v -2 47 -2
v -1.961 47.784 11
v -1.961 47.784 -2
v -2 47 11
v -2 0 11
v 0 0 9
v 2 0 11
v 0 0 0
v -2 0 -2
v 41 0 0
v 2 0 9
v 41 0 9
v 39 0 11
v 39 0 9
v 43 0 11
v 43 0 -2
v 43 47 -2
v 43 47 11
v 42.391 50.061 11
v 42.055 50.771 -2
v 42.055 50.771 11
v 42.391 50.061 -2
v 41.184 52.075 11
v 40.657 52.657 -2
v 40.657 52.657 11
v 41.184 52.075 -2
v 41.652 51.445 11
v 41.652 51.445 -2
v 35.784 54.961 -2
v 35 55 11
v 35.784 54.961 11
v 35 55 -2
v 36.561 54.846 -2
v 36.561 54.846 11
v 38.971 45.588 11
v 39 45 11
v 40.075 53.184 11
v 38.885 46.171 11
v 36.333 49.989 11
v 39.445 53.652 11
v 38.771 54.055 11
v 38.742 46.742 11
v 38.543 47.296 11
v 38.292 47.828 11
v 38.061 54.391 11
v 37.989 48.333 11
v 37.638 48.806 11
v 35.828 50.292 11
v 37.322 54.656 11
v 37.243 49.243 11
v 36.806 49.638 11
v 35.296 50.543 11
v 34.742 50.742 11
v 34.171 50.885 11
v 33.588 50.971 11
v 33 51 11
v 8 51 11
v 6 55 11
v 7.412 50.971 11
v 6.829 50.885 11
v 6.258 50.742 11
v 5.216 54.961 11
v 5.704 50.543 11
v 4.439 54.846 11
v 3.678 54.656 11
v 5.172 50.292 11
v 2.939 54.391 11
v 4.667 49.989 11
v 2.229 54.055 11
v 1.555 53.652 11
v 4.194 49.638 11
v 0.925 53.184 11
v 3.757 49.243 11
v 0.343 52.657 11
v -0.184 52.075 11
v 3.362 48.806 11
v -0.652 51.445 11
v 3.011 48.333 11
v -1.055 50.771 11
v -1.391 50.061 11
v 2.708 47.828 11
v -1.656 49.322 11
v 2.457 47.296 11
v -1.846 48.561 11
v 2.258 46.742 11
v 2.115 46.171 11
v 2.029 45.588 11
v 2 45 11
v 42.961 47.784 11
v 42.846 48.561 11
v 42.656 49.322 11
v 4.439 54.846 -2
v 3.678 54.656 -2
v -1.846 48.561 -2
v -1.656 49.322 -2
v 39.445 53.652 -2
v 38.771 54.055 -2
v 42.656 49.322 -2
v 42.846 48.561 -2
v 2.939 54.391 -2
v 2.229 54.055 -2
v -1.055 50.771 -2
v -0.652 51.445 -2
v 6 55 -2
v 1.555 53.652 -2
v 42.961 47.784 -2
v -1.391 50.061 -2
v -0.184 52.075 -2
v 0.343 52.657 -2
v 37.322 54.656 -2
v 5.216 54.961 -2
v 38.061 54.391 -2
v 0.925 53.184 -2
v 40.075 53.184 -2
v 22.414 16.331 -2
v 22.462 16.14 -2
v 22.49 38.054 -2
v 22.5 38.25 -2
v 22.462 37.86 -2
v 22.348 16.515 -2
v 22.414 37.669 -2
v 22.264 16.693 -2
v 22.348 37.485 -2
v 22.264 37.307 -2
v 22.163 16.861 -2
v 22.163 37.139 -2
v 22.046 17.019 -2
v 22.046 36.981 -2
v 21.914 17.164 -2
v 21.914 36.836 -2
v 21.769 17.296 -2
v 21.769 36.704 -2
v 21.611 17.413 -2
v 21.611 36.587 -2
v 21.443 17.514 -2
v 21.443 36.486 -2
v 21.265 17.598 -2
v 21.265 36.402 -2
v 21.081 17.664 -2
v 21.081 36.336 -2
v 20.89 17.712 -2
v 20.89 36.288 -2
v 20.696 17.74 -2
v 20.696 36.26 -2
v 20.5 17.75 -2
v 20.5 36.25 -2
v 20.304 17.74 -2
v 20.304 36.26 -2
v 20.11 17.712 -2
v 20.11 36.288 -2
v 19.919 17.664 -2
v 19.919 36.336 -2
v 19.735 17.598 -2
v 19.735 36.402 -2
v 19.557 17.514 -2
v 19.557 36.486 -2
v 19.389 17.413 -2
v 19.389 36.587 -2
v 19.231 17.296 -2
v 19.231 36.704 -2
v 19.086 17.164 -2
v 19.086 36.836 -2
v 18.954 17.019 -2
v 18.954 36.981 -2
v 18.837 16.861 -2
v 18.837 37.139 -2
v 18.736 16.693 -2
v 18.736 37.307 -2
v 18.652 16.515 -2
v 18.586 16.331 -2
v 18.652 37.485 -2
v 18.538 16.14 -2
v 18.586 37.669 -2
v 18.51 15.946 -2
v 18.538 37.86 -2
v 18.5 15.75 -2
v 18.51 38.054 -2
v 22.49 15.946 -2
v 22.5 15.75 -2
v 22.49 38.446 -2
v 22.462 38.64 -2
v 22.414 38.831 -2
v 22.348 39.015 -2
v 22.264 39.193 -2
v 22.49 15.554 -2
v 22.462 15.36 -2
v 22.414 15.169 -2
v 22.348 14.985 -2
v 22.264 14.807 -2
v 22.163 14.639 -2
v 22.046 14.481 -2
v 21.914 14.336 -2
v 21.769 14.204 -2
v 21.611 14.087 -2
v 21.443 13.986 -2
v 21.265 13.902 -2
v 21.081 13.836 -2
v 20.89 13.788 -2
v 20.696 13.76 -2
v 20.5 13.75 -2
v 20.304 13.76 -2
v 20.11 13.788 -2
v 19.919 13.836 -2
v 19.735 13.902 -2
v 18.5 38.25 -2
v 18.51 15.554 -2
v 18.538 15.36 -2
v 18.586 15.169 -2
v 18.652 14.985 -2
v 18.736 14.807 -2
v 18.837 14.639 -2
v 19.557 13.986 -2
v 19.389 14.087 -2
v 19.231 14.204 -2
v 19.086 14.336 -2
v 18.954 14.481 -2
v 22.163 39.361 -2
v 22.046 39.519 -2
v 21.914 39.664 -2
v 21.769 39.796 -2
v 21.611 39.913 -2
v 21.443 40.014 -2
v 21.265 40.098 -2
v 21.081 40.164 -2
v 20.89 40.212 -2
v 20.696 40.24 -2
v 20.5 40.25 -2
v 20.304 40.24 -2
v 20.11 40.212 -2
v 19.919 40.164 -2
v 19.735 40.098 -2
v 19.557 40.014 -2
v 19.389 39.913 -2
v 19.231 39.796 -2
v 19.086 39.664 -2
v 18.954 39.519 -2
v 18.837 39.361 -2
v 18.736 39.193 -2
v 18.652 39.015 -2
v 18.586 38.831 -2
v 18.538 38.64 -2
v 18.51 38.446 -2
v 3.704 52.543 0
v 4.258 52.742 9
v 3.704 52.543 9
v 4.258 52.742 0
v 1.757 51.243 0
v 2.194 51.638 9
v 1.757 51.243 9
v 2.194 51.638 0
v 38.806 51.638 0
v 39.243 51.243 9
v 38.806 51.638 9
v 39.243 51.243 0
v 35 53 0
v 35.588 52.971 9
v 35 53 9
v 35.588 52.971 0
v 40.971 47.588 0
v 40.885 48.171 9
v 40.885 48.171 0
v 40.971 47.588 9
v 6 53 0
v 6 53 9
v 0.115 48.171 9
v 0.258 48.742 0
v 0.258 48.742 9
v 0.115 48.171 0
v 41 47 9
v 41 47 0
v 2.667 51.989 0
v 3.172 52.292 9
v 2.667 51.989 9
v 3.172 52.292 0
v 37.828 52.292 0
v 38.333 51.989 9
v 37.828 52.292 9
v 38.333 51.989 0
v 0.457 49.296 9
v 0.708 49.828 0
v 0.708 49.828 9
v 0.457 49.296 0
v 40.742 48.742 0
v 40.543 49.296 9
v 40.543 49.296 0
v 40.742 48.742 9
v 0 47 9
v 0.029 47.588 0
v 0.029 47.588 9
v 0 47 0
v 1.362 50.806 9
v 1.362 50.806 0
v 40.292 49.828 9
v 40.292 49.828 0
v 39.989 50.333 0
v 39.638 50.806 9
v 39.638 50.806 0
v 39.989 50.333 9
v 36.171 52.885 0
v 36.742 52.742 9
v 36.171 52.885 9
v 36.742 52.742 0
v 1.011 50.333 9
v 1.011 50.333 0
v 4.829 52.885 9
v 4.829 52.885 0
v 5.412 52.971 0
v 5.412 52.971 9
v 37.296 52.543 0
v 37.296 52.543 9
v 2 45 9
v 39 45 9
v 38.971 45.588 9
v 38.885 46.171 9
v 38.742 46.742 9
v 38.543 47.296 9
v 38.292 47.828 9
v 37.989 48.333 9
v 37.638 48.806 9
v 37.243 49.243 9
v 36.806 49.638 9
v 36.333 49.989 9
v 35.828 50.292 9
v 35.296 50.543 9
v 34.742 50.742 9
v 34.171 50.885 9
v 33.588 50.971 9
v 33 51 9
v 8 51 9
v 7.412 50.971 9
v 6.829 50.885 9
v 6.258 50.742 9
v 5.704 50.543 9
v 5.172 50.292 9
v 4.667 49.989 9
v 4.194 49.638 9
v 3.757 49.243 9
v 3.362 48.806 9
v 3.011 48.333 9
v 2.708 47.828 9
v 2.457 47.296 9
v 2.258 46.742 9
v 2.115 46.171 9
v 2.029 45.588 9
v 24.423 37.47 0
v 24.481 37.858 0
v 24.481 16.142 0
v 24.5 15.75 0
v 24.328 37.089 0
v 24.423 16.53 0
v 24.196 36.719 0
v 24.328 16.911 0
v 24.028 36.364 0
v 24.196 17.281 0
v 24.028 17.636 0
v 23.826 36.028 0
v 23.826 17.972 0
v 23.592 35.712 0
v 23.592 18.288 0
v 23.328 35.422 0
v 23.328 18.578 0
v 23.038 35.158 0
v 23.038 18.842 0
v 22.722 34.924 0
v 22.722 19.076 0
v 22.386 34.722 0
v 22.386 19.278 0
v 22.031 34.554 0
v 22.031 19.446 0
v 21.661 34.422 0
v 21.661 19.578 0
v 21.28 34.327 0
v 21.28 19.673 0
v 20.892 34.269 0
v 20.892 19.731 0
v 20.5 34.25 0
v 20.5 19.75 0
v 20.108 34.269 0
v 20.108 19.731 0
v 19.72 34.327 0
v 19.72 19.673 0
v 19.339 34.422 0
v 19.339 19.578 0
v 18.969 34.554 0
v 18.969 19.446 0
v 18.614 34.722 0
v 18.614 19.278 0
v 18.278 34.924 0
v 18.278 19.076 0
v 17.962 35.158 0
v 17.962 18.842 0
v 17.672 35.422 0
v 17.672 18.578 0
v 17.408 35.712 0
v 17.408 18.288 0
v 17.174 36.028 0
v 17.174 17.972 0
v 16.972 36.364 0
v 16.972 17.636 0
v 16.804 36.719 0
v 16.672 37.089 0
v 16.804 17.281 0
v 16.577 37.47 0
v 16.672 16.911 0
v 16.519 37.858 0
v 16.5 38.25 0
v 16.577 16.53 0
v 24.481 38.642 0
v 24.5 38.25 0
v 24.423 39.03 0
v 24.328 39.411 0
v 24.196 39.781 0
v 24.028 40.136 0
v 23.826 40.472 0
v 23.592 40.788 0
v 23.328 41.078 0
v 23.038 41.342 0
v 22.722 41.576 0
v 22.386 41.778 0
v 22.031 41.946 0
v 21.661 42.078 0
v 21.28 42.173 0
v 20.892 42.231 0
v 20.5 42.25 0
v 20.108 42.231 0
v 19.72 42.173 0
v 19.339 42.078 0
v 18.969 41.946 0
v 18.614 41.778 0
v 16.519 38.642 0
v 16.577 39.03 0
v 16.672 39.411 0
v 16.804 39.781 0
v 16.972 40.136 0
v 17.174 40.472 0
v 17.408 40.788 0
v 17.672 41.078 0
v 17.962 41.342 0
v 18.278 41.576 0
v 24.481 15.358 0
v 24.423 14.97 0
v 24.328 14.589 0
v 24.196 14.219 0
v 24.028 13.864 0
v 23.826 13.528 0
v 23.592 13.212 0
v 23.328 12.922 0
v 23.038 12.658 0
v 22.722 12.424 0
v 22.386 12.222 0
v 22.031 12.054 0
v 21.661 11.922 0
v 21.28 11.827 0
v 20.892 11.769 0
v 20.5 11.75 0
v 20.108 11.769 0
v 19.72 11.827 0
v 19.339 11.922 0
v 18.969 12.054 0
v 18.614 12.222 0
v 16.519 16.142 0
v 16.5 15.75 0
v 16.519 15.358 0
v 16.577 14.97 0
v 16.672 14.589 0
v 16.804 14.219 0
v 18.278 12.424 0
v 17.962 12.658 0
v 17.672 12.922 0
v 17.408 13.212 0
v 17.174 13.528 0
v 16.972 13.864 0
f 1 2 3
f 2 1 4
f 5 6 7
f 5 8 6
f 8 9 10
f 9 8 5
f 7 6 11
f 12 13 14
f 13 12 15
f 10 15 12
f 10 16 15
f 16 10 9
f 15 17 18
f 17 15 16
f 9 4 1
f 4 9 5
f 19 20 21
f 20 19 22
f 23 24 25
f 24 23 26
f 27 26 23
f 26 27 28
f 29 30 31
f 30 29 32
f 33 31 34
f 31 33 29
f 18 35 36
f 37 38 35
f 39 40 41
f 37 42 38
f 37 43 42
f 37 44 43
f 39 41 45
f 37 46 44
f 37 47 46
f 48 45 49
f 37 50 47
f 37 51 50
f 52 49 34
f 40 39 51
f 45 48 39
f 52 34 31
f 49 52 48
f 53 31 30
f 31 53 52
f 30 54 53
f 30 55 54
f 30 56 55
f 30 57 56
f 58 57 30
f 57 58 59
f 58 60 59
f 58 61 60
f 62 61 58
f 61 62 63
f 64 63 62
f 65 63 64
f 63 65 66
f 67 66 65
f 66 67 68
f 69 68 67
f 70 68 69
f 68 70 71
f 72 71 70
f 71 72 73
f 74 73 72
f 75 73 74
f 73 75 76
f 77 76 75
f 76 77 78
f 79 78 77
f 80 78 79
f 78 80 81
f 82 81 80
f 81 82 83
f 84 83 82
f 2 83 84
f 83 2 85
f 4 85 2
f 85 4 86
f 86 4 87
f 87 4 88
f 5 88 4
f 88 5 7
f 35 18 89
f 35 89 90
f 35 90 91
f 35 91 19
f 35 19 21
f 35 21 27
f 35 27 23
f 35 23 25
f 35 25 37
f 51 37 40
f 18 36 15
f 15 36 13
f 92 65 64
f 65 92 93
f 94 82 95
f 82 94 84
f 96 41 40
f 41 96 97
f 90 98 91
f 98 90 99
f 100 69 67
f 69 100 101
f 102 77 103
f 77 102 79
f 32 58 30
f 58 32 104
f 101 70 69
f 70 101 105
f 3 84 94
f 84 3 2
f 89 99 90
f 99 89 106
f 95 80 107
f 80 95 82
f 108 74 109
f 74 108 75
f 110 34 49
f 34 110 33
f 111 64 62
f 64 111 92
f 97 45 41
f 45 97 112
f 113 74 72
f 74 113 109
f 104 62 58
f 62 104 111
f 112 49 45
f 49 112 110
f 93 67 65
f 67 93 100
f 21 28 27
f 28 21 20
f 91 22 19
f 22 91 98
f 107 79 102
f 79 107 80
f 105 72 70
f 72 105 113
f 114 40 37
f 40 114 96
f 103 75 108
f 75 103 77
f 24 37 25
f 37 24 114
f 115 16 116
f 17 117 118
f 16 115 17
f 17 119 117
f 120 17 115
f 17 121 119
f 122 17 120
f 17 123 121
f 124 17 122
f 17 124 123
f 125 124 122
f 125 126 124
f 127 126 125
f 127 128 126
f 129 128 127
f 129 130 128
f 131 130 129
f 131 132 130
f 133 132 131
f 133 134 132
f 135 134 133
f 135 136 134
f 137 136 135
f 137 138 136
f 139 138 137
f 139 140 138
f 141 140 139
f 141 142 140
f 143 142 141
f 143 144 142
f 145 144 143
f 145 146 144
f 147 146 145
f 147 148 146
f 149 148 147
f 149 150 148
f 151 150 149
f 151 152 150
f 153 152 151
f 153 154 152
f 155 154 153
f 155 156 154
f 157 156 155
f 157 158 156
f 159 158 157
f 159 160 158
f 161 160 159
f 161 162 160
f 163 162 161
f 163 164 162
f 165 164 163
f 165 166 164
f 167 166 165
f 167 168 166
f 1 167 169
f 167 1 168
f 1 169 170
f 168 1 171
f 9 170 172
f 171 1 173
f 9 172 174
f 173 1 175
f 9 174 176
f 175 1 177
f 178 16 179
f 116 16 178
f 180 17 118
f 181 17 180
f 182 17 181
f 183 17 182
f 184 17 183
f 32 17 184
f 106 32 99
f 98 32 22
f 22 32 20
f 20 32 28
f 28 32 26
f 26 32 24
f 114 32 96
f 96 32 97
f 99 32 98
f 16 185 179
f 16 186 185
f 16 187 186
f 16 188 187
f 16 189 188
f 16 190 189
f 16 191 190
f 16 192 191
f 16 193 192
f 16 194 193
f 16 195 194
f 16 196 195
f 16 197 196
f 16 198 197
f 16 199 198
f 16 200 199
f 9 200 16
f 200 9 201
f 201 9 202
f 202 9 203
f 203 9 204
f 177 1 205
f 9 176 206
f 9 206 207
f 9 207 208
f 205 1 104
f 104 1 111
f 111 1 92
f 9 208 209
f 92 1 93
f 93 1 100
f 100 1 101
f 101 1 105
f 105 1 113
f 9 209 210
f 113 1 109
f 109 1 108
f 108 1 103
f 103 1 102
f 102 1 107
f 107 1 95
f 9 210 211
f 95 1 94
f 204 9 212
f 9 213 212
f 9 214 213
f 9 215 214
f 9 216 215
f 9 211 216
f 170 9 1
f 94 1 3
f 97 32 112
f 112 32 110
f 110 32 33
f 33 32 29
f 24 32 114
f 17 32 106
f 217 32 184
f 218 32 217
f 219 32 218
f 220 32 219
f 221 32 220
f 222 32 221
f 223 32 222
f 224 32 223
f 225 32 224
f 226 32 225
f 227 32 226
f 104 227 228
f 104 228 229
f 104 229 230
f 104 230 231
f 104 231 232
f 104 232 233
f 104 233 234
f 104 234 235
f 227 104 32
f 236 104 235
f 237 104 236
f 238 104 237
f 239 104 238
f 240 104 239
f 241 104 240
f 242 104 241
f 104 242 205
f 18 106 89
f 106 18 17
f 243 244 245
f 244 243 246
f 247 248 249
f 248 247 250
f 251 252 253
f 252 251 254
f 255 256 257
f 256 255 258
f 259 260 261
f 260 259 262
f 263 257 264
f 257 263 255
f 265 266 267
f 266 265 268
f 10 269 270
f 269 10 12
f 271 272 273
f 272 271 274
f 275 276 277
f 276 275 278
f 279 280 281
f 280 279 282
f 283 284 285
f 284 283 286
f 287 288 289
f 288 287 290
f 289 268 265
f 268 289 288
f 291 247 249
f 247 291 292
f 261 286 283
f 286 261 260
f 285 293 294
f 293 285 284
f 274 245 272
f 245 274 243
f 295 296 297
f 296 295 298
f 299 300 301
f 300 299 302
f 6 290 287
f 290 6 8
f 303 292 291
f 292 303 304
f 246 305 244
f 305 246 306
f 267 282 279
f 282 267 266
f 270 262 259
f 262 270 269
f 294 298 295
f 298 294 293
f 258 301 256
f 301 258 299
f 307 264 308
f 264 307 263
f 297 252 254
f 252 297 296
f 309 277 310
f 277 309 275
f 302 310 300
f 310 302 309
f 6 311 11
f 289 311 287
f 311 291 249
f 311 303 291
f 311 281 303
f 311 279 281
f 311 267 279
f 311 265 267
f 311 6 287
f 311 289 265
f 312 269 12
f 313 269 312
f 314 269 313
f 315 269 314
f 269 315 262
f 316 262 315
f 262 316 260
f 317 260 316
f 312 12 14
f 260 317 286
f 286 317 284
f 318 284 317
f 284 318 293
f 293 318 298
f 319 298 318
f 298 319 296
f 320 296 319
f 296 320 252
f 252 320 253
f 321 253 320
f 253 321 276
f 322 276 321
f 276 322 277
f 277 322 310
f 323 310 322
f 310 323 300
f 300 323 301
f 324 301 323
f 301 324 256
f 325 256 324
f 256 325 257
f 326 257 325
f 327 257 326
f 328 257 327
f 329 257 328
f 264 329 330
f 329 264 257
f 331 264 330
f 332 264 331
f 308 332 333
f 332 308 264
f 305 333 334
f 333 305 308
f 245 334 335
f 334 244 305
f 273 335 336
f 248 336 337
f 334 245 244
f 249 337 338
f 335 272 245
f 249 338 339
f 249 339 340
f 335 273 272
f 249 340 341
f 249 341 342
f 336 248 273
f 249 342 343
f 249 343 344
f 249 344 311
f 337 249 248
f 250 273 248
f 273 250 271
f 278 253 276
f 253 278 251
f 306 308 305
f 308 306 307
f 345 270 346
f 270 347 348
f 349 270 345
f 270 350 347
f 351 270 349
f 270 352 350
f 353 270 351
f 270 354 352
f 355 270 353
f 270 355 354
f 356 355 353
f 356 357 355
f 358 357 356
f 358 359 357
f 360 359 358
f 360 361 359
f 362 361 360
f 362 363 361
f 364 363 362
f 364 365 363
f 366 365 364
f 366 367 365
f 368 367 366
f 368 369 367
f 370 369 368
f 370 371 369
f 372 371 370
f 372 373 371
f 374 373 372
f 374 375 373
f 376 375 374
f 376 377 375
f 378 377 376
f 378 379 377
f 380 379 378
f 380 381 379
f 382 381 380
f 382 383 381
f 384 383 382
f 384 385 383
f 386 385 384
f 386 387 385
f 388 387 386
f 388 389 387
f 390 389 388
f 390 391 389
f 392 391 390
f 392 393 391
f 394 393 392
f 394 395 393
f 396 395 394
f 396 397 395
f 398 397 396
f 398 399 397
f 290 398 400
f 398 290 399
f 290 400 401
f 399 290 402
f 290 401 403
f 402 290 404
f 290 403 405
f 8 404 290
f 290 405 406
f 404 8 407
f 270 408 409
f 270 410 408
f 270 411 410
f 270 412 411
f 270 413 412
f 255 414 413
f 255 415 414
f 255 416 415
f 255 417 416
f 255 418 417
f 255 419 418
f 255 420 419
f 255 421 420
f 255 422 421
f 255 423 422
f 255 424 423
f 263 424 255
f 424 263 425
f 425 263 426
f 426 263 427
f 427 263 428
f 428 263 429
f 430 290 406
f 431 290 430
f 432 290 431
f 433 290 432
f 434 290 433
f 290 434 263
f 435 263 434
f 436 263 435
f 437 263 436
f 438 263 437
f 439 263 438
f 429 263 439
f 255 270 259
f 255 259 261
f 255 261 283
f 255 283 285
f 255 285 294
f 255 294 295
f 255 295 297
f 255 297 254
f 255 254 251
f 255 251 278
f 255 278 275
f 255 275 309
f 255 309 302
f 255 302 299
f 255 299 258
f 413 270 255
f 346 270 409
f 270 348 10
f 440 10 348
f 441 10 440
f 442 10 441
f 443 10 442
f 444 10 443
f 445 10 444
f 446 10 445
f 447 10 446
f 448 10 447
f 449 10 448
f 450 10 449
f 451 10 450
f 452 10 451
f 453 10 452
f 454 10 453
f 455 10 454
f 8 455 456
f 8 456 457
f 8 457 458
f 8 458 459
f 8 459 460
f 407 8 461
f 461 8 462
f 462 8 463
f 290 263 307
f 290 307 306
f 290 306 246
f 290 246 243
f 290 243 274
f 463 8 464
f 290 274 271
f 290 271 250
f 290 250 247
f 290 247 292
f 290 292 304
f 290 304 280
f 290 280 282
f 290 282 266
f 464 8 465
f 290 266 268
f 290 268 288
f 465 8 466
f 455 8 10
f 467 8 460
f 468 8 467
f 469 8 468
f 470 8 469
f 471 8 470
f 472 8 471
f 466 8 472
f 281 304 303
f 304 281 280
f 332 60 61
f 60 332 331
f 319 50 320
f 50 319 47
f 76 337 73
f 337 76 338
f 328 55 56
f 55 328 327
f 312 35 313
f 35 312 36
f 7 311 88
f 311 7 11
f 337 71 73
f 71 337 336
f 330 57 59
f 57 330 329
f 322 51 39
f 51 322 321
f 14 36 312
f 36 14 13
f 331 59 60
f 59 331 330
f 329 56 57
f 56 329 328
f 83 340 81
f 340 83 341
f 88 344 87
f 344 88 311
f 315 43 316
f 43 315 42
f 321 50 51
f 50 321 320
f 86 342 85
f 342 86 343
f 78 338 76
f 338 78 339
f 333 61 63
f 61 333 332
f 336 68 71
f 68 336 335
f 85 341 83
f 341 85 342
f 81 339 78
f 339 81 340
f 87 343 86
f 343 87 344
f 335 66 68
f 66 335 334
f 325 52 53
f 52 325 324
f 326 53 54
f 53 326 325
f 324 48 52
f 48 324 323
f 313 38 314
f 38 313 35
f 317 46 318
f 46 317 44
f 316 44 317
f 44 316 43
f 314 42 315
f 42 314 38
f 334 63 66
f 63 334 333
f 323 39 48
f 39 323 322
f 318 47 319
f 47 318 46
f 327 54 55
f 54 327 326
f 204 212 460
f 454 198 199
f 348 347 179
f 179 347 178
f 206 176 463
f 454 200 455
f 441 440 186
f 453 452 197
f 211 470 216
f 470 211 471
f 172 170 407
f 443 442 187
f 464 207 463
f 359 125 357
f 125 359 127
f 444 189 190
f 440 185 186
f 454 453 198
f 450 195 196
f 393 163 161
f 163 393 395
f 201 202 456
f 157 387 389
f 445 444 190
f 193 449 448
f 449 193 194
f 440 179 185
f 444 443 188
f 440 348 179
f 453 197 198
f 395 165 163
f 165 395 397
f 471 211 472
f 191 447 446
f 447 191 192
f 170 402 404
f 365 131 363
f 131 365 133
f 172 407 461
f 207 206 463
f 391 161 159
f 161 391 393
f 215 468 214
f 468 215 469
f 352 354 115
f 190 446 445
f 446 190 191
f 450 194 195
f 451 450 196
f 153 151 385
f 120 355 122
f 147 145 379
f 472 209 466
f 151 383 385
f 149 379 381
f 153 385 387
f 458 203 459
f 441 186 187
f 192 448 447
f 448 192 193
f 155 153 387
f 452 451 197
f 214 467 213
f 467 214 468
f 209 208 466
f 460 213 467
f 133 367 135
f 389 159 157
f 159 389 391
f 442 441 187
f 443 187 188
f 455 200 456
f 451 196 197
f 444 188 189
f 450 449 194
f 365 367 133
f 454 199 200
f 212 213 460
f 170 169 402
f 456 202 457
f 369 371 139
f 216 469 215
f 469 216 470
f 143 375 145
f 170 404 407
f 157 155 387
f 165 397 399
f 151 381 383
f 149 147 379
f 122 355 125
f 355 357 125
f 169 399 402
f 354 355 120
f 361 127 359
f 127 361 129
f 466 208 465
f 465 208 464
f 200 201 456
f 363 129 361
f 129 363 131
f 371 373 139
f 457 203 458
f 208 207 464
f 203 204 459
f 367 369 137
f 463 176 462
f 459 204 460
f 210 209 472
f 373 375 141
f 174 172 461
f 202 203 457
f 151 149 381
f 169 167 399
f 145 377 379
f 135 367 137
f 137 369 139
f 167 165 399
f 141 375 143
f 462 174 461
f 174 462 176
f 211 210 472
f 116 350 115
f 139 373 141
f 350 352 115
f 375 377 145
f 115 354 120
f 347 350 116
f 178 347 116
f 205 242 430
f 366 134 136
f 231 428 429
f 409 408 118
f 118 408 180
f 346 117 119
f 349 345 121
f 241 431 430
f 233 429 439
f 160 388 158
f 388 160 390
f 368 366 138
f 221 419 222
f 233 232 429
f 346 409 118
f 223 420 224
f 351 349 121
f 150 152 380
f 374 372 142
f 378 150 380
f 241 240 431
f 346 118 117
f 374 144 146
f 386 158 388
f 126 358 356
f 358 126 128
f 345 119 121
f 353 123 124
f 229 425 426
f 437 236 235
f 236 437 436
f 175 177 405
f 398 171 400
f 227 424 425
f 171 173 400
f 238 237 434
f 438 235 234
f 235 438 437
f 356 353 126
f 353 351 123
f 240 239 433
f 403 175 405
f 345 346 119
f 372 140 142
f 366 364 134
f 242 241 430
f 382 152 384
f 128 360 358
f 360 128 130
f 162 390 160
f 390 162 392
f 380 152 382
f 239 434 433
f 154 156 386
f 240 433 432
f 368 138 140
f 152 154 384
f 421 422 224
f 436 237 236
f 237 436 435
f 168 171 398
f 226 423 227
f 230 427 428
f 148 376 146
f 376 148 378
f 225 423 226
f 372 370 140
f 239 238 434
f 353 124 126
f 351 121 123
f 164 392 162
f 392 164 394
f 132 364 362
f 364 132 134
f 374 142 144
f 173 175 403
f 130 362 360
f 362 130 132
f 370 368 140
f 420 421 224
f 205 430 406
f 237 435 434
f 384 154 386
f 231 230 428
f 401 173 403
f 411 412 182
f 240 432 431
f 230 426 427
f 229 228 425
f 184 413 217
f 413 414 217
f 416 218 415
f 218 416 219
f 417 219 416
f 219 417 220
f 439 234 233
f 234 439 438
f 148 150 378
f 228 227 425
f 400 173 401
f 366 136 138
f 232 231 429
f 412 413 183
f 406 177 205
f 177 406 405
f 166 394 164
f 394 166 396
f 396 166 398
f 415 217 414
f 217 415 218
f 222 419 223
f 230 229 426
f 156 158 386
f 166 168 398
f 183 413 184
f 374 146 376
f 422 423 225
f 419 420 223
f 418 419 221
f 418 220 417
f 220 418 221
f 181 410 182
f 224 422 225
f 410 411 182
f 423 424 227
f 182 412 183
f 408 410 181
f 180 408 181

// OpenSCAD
REMOTE_X = 41;
REMOTE_Y = 9;
REMOTE_Z = 45;
CURVE = 6;
THICKNESS = 2;
D1=9;
D2=5;

module cone() {
    cylinder(d2=8, d1=4, h=THICKNESS, $fn=64);
}

difference() {
    translate([CURVE, 0, -1 * THICKNESS]) hull() {
        translate([-1 * (THICKNESS + CURVE), 0, 0]) cube([(2 * THICKNESS) + REMOTE_X, 1, REMOTE_Y + (2 * THICKNESS)]);
        translate([0, REMOTE_Z + THICKNESS, 0]) hull() {
                translate([REMOTE_X - (2 * CURVE), 0,  0]) cylinder(h=REMOTE_Y + (2 * THICKNESS), r=CURVE + THICKNESS, $fn=64);
                cylinder(h=REMOTE_Y + (2 * THICKNESS), r=CURVE + THICKNESS, $fn=64);

        }
    }


    hull() {
        cube([REMOTE_X, 40, REMOTE_Y]);
        translate([CURVE, REMOTE_Z + THICKNESS, 0]) hull() {
            cylinder(h=REMOTE_Y, r=CURVE, $fn=64);
            translate([REMOTE_X - (2 * CURVE), 0, 0]) cylinder(h=REMOTE_Y, r=CURVE, $fn=64);
        }
    }
    
    translate([THICKNESS, 0, 2 * THICKNESS]) hull() {
        cube([REMOTE_X - (2 * THICKNESS), 40, REMOTE_Y]);
        translate([CURVE + THICKNESS, REMOTE_Z, 0]) hull() {
            translate([-1 * THICKNESS, 0, 0]) cylinder(h=REMOTE_Y, r=CURVE, $fn=64);
            translate([REMOTE_X - (2 * CURVE) - (3 * THICKNESS), 0, 0]) cylinder(h=REMOTE_Y, r=CURVE, $fn=64);
        }
    }
    
    translate([(0.5 * REMOTE_X), 0.35 * REMOTE_Z, -1 * THICKNESS]) cone();
    translate([(0.5 * REMOTE_X), 0.85 * REMOTE_Z, -1 * THICKNESS]) cone();        
}
